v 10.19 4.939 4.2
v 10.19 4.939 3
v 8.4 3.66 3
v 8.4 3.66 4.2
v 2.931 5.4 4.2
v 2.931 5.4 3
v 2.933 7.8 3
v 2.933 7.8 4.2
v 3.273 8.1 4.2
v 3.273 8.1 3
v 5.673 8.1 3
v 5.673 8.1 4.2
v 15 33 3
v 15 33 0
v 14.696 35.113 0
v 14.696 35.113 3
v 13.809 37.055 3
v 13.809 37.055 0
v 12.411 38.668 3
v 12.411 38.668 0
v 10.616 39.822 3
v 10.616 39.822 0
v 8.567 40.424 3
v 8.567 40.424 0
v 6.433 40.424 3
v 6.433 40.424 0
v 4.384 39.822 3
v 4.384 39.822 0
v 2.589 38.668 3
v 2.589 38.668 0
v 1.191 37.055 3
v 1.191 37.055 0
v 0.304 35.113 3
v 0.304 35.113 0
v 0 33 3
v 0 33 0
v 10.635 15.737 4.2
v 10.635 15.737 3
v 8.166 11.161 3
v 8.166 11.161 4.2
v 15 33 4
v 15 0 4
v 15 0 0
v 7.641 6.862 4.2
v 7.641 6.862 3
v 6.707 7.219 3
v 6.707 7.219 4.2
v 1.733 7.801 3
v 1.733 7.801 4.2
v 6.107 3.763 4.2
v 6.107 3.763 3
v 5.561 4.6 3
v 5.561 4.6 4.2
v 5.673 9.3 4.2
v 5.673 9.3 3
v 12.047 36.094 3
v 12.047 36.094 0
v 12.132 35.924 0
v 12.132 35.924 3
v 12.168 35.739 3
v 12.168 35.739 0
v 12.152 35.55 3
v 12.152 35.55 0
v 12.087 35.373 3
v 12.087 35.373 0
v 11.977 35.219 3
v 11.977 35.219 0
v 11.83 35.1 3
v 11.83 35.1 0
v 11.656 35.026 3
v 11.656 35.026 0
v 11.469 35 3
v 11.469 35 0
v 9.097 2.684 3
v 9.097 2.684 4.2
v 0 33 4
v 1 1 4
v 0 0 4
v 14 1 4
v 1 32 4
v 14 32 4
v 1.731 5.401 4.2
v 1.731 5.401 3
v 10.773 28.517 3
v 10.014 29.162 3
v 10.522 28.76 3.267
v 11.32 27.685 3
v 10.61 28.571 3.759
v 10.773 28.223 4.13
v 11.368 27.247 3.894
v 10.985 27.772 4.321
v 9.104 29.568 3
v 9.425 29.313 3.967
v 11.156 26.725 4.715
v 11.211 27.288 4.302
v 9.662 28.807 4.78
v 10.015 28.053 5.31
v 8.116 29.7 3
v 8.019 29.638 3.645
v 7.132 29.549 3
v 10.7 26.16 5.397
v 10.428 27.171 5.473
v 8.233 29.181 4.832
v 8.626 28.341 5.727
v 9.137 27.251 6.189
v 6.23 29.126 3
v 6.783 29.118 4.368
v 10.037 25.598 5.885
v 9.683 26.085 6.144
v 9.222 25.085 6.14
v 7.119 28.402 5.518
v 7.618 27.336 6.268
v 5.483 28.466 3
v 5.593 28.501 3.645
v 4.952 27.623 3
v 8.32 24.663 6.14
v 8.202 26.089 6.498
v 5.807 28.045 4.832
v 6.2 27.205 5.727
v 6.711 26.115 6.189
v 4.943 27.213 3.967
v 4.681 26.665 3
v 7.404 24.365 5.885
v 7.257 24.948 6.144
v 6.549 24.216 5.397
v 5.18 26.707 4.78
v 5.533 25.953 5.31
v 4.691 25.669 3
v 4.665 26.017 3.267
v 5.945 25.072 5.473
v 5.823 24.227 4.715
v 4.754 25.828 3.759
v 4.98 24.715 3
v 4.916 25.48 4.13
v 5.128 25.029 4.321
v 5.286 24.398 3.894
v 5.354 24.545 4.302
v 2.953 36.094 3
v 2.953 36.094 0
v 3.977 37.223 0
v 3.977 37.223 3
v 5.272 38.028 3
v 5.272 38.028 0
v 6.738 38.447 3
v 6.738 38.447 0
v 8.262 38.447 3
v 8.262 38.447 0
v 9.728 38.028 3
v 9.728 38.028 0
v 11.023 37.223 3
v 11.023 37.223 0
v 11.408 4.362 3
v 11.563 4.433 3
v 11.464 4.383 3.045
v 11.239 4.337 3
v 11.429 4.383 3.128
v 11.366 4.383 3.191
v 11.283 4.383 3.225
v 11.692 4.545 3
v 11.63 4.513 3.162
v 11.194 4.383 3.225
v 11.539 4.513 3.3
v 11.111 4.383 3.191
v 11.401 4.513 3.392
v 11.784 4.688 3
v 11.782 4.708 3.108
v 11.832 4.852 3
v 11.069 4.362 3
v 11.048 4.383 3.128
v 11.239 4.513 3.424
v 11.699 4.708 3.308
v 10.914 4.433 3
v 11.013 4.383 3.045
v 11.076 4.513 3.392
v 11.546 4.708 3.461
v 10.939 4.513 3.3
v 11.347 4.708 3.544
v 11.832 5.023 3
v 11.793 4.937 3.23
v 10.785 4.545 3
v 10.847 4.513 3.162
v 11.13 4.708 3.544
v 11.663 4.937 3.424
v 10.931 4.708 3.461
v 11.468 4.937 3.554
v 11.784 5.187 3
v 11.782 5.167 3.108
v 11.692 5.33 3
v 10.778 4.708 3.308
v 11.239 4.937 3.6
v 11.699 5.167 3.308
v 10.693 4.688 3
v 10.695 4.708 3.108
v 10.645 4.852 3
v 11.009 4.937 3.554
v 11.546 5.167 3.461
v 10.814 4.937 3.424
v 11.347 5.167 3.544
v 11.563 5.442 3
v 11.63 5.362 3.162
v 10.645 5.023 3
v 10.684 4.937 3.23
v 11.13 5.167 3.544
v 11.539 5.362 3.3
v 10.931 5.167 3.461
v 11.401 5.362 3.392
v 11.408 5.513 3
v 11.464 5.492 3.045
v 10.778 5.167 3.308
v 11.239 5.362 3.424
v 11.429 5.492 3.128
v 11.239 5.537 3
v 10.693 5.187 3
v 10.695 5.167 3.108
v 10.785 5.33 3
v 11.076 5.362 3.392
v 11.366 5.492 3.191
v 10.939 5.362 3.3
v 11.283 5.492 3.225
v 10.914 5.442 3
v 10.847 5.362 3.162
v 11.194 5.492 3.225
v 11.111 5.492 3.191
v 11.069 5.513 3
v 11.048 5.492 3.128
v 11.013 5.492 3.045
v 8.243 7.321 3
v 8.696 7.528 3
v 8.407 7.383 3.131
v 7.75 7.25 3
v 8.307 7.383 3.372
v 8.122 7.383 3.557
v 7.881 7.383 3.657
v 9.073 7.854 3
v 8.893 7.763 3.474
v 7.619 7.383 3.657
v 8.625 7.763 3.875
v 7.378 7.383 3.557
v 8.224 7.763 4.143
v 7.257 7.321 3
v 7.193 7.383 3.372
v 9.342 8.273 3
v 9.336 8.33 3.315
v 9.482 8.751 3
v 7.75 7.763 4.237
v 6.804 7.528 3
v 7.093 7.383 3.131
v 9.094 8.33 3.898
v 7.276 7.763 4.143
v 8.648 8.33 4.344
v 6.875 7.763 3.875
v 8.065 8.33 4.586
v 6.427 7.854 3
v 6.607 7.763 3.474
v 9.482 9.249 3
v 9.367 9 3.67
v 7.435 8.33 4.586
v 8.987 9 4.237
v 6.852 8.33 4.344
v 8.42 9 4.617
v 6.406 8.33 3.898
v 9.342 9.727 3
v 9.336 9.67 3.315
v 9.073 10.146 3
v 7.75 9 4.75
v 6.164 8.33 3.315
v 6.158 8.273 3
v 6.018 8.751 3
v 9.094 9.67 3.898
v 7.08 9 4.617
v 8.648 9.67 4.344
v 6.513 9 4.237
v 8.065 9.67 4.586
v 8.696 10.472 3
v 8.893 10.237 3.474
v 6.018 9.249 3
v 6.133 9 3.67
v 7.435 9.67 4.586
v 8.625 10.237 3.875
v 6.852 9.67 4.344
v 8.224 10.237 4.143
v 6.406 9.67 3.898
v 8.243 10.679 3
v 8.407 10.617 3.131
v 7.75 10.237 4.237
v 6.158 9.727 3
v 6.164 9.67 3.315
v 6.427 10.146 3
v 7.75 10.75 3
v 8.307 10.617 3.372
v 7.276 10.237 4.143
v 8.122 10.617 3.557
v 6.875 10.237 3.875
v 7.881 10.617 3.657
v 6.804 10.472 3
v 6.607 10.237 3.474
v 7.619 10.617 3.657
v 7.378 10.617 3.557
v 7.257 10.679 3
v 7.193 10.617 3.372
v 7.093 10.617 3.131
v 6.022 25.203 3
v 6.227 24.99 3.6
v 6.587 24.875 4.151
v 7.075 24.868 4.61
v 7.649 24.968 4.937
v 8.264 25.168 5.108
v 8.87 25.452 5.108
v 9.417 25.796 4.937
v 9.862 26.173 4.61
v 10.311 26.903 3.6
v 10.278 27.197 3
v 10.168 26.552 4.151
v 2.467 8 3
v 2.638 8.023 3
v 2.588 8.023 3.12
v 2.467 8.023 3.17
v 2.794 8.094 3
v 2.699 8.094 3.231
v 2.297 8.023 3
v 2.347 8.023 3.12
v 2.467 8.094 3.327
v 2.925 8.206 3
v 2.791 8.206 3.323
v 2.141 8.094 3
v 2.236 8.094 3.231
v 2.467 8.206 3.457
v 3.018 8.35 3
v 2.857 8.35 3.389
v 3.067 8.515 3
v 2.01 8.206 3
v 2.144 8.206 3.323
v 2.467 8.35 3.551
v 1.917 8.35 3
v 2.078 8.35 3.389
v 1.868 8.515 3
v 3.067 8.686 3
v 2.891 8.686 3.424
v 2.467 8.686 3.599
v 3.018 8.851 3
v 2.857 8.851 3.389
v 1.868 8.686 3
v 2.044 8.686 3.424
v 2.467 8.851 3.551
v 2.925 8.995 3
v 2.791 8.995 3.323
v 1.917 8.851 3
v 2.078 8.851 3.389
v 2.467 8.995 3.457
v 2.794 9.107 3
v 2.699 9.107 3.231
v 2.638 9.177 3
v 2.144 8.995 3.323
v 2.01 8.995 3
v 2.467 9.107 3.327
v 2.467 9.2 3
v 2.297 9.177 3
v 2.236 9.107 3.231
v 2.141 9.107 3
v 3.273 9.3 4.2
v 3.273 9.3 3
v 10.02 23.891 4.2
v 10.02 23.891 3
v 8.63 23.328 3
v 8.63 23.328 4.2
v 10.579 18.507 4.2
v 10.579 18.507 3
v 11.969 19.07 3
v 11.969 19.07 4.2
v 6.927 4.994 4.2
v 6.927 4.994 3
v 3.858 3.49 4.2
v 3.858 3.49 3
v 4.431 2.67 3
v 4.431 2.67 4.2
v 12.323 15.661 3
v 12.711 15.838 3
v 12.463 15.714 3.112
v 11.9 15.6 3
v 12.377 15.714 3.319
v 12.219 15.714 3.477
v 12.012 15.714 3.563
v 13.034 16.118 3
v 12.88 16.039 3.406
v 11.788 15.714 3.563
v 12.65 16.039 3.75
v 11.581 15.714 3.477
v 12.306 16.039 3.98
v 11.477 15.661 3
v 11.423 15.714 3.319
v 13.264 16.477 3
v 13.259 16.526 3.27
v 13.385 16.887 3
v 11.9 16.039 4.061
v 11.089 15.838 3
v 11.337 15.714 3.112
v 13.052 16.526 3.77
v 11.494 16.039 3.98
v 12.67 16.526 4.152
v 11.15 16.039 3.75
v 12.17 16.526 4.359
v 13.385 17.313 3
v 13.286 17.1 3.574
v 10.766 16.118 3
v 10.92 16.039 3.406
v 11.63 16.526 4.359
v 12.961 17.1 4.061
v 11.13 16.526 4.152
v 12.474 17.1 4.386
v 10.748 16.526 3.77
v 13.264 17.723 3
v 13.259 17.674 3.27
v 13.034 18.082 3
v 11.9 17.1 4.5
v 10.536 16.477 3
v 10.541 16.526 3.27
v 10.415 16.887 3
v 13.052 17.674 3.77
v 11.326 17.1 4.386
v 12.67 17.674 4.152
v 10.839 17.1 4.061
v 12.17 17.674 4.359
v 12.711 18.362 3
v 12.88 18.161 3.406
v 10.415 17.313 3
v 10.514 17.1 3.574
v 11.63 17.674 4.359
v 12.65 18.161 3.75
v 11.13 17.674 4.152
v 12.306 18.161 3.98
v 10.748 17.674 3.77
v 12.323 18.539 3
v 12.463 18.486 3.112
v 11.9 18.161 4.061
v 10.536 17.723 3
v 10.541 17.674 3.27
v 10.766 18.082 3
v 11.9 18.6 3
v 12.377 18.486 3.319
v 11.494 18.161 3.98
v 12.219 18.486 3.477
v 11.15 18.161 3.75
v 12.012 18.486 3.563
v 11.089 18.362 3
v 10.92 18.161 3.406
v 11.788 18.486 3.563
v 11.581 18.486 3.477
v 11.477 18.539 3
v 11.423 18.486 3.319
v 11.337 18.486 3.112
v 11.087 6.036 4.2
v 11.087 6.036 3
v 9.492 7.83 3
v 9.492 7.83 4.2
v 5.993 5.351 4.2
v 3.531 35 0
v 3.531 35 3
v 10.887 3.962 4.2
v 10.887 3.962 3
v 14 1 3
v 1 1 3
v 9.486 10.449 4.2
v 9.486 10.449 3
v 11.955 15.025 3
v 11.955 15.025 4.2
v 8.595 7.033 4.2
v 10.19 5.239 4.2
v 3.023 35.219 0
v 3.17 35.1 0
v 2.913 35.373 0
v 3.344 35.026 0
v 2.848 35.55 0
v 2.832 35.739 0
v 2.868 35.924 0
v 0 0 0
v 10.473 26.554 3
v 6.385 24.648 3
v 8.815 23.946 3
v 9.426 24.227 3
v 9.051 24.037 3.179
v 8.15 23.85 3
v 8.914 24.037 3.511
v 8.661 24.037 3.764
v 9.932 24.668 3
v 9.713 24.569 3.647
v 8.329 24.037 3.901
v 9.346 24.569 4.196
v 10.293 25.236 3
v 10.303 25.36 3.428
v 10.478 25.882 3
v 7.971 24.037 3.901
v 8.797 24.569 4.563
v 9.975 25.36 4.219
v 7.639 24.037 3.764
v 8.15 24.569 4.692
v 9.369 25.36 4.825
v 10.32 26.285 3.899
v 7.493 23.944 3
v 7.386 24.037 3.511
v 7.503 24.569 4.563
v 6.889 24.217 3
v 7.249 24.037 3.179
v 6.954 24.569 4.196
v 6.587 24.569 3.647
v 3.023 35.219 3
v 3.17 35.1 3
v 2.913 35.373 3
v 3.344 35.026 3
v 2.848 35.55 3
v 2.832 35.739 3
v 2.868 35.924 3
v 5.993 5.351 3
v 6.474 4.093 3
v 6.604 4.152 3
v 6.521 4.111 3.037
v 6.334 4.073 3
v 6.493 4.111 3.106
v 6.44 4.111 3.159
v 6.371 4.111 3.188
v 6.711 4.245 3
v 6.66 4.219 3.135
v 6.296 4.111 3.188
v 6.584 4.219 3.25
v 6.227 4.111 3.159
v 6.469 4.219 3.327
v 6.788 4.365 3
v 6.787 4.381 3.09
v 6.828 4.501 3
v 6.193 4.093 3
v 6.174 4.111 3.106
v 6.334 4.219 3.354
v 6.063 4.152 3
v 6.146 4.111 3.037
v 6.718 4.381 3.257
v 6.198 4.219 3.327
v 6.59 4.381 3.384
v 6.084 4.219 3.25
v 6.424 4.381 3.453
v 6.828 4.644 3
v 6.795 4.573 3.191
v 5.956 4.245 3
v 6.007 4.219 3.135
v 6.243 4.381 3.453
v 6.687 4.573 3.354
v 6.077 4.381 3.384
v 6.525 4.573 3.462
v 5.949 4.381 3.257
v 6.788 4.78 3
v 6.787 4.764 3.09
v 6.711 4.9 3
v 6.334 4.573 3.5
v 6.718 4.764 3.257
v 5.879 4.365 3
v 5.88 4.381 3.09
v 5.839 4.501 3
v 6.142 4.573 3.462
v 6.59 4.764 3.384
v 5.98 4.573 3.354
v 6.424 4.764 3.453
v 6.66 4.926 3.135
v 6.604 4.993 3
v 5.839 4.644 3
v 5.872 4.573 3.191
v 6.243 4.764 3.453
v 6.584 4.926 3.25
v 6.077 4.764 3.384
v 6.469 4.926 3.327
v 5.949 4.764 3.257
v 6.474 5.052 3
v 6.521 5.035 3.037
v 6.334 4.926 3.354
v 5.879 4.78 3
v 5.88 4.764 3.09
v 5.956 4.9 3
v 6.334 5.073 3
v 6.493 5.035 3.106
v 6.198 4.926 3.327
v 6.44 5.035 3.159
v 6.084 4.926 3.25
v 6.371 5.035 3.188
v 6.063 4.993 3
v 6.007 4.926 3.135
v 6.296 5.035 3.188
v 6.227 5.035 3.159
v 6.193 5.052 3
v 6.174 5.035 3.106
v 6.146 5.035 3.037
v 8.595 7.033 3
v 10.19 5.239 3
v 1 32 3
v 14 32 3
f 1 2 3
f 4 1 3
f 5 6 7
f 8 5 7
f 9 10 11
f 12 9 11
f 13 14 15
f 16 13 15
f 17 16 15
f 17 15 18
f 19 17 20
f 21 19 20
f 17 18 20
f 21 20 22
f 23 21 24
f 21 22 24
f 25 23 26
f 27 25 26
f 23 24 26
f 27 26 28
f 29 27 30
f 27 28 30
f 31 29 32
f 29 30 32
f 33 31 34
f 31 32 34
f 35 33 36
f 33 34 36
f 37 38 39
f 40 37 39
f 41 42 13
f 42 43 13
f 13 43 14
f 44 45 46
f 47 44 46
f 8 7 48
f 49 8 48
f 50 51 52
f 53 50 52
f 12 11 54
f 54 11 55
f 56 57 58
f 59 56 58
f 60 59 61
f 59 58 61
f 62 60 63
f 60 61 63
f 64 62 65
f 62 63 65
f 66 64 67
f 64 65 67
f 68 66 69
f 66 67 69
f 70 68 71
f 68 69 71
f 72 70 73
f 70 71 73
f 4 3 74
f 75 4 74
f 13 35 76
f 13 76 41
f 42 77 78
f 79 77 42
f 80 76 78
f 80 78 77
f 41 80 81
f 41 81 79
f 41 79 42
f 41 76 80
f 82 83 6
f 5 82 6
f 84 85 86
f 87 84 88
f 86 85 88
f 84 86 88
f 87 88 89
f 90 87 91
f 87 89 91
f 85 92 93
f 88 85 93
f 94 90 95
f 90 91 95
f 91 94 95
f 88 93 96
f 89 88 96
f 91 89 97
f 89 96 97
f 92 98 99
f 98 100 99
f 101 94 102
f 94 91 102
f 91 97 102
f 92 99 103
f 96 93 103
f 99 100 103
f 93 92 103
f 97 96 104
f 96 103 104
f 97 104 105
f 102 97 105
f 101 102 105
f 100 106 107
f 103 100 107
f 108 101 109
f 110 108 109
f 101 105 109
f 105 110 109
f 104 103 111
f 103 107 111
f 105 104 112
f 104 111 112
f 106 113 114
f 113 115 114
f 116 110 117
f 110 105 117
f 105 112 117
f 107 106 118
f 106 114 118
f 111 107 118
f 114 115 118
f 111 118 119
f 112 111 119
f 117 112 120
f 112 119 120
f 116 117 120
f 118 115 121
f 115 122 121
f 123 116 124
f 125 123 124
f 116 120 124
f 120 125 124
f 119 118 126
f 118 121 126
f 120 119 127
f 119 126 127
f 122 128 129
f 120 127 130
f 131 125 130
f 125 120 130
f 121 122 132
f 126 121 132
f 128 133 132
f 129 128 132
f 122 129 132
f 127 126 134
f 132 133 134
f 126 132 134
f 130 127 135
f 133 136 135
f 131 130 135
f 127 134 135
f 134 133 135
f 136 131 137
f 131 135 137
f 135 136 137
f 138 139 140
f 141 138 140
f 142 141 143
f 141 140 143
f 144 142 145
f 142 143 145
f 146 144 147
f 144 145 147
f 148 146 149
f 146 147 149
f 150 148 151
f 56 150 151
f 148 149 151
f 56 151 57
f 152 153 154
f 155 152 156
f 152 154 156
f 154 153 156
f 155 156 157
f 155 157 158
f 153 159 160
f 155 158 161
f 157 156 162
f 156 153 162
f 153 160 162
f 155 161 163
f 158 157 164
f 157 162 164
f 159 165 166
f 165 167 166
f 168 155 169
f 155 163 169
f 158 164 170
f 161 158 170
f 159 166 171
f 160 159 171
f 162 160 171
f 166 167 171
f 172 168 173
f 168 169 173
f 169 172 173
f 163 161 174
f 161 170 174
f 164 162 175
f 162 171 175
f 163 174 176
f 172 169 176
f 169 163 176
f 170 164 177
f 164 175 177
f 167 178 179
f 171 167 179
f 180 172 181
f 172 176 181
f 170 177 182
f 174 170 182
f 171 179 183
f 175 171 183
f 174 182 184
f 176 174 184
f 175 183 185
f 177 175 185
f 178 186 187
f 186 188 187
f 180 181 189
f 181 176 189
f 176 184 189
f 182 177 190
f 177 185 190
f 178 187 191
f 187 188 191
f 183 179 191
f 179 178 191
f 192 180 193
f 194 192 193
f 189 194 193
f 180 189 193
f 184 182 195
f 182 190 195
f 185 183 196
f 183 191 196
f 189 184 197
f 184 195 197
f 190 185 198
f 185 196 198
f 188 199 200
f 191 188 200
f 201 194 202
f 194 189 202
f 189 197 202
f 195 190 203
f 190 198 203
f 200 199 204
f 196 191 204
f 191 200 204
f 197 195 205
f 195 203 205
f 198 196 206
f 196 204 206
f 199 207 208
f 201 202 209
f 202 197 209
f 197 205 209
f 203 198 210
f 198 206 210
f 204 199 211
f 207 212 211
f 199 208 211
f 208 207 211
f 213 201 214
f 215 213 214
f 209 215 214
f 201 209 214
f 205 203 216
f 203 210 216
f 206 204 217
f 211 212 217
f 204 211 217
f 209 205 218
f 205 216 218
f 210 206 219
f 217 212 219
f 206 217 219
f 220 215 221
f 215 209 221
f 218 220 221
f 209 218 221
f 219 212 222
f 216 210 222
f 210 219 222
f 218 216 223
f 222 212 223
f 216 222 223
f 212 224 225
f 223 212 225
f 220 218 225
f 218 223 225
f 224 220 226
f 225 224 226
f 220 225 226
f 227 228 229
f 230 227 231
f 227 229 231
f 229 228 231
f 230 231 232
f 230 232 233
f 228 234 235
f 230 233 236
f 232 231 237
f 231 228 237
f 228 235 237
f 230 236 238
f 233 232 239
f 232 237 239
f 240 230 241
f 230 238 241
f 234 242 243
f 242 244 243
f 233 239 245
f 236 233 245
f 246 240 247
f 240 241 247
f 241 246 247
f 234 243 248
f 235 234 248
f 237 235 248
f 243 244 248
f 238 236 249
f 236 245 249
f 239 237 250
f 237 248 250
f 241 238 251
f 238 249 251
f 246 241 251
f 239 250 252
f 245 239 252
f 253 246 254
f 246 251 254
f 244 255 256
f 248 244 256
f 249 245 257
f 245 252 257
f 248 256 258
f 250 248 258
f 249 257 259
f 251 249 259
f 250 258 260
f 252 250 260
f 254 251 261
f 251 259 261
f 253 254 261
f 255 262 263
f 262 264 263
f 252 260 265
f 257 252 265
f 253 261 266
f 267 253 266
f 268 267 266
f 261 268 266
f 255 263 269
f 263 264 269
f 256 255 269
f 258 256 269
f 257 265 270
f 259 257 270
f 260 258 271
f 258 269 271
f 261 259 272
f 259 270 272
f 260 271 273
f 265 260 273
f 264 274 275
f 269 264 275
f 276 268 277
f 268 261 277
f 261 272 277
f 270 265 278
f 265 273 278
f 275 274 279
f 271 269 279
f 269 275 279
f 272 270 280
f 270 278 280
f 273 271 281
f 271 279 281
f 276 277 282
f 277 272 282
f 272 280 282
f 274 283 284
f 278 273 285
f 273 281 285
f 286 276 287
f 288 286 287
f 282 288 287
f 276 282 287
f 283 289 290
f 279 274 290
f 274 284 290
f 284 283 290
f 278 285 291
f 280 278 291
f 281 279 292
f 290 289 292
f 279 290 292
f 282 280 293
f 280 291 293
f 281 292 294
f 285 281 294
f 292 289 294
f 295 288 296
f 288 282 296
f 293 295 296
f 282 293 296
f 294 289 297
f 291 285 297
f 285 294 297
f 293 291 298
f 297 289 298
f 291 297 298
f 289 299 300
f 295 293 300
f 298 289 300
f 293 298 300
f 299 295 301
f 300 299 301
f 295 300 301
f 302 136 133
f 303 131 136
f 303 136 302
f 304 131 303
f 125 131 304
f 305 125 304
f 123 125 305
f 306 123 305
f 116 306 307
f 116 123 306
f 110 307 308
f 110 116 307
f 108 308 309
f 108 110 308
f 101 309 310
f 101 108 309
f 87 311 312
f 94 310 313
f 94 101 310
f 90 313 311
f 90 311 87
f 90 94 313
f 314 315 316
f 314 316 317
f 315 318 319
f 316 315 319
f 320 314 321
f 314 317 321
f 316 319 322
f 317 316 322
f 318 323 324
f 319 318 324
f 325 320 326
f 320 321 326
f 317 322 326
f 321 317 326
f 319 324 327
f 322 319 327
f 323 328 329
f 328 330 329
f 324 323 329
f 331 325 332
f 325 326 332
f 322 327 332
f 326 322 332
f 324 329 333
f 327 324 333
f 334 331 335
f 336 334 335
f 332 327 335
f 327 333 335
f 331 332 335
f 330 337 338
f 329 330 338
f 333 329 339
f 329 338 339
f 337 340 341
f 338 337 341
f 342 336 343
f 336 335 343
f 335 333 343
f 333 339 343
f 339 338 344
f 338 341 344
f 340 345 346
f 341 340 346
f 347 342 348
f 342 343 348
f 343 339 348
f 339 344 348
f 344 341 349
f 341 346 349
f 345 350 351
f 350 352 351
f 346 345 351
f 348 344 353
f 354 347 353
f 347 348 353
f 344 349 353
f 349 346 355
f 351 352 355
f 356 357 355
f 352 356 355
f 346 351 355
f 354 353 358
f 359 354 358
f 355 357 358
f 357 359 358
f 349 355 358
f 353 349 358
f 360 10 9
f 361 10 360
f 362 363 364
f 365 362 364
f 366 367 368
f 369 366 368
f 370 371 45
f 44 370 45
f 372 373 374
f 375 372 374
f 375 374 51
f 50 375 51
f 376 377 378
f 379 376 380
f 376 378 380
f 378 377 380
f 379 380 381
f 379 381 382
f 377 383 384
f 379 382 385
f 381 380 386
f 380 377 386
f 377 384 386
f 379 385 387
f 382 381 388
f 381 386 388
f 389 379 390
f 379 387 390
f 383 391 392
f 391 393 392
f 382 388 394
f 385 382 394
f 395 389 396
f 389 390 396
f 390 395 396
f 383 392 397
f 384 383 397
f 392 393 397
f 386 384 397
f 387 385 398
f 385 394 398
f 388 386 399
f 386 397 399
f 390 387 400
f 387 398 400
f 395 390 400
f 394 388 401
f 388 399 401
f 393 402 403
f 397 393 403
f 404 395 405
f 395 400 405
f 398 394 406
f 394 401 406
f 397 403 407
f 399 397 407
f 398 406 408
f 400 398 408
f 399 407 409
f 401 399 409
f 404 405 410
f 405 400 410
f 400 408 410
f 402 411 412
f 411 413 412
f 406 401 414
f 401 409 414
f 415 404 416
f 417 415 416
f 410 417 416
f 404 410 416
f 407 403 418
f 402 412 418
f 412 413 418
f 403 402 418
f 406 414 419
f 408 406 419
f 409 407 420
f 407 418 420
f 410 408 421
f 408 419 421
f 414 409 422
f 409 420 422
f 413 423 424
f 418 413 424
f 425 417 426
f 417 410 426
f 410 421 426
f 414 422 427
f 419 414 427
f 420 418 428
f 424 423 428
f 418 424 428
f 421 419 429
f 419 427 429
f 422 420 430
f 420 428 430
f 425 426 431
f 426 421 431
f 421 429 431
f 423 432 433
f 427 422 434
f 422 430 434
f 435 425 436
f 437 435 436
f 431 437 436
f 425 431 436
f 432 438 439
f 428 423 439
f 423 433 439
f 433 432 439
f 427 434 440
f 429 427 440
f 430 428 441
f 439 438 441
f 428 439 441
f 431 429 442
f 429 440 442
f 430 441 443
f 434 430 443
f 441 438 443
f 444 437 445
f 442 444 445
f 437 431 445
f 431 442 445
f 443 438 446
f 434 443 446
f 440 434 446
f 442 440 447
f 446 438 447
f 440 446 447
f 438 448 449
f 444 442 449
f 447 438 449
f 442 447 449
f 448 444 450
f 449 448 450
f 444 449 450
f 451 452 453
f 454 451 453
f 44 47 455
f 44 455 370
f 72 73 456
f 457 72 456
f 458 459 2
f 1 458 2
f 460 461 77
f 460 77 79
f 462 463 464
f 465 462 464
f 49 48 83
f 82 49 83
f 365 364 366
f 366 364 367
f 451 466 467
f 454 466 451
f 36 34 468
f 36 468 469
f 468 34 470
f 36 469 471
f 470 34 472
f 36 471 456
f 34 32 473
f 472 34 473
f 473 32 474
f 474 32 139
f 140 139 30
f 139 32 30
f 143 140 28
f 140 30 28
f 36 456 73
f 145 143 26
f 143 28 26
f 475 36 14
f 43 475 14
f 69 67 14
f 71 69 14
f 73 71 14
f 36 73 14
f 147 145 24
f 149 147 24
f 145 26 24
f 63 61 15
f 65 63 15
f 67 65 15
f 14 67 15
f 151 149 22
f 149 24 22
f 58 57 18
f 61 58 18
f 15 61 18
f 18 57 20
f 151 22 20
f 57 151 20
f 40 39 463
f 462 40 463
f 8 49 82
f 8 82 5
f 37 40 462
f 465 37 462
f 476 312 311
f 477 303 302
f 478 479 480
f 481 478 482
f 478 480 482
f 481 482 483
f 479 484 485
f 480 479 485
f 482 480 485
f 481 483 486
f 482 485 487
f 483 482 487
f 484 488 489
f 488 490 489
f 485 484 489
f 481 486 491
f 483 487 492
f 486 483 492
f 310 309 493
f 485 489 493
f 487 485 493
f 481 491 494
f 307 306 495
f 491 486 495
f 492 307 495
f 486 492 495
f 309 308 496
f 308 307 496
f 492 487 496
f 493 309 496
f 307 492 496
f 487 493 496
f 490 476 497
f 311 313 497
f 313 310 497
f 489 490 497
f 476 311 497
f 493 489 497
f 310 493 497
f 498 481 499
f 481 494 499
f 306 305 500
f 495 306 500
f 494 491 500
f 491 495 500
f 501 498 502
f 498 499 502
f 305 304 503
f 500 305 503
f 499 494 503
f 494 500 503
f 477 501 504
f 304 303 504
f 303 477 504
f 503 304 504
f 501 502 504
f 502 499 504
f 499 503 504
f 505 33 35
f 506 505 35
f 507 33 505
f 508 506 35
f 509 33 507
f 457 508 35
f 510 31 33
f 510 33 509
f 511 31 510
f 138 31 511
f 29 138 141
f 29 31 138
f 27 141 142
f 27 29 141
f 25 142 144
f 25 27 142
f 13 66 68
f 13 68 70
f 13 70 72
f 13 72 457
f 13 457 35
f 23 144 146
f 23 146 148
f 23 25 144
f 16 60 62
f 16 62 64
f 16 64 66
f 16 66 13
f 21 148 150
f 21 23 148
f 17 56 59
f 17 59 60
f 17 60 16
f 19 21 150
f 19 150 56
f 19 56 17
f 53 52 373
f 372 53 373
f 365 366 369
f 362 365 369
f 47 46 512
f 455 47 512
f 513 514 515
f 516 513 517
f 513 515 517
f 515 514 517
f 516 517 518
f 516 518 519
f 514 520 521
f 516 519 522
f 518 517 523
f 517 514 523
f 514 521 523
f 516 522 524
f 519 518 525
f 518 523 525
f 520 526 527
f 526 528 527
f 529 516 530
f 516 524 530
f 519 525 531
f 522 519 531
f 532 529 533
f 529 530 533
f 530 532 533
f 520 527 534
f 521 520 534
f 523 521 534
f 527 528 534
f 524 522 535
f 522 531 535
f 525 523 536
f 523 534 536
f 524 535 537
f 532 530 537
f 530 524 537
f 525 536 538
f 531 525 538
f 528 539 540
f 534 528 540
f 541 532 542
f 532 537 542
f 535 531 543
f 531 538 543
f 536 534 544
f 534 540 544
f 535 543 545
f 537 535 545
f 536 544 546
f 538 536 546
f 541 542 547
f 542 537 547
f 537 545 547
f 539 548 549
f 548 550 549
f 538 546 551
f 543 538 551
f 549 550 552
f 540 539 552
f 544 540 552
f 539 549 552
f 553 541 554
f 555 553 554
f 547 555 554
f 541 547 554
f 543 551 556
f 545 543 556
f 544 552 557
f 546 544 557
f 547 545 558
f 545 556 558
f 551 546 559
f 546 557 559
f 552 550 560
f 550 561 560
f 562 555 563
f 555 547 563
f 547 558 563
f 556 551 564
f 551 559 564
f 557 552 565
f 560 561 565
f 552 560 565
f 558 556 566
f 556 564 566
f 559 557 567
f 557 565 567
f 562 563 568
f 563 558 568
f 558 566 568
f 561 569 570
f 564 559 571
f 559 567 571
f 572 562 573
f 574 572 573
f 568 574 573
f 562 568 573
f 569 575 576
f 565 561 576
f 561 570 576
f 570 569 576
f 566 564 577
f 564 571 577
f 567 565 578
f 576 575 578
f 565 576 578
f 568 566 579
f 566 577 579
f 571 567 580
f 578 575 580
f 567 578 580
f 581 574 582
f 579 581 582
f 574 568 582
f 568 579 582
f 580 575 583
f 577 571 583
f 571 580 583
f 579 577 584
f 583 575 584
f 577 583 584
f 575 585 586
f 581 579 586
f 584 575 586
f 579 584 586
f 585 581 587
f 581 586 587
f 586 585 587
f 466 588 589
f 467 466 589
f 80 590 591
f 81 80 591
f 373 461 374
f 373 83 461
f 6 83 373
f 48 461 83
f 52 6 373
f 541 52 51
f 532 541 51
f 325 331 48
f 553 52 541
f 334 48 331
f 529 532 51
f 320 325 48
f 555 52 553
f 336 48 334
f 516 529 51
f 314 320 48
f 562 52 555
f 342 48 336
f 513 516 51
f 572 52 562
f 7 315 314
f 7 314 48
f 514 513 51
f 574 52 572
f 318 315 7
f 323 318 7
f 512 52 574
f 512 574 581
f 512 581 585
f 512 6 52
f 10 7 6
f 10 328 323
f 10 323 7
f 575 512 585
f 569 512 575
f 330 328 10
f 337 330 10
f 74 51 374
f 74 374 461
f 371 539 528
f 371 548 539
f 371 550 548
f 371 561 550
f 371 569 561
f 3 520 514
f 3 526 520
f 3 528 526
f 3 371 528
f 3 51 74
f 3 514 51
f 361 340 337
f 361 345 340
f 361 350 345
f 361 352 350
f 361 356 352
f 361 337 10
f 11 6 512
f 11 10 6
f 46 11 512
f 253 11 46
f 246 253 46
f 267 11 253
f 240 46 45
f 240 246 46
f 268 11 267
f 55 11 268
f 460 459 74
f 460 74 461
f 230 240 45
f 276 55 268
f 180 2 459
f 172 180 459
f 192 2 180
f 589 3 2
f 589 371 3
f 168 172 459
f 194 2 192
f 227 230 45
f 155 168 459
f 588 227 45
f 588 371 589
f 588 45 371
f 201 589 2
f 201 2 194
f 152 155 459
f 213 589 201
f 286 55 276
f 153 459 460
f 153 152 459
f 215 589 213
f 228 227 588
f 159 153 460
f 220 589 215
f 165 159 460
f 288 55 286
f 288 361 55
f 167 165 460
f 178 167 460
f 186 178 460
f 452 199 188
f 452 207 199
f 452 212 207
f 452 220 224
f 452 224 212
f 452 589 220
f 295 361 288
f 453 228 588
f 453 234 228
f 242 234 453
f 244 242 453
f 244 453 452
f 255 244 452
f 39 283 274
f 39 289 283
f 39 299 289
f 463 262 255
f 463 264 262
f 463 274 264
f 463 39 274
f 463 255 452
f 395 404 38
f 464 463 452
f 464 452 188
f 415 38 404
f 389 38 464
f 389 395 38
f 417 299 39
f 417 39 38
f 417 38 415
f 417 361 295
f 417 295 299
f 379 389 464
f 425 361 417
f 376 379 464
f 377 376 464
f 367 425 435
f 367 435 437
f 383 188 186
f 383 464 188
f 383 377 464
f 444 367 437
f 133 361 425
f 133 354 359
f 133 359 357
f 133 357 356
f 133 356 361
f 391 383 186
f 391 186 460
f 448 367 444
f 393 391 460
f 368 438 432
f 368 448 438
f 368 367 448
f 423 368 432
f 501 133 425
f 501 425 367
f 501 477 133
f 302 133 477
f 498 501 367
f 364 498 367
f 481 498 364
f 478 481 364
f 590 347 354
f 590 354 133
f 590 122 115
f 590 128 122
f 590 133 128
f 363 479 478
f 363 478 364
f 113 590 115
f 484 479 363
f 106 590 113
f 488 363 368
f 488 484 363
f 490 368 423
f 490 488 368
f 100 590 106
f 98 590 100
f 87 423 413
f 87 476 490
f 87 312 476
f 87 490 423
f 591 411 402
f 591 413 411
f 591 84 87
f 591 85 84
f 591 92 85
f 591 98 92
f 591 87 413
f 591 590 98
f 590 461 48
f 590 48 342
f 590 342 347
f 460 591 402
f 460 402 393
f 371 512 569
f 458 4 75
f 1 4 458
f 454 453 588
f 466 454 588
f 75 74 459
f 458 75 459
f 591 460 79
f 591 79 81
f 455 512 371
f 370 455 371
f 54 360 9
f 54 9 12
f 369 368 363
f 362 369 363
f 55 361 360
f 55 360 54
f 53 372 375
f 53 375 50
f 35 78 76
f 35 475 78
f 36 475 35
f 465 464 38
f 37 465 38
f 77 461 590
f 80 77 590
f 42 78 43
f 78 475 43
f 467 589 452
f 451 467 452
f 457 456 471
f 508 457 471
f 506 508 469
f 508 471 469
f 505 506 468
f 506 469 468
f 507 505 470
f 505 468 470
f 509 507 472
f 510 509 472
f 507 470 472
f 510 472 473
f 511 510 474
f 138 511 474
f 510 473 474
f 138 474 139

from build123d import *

# Parameters (mm, degrees)
F0_W      = 15
F0_H      = 33
F1_DEPTH  = 3
F3_W      = 2.4
F3_H      = 1.2
F4_DEPTH  = 1.2
F7_DEPTH  = 1.2
F9_ANGLE  = 180
F11_ANGLE = 180
F15_ANGLE = 180
F16_ANGLE = 180
F18_ANGLE = 180
F19_ANGLE = 115
F20_ANGLE = 180
F2_W      = 15
F2_H      = 33
F2_W_2    = 13
F2_H_2    = 31
F21_DEPTH = 1


with BuildPart() as f1:
    # F0 (on Top) → F1 (new body)
    with BuildSketch(Plane.XY):
        with Locations((7.5, 16.5)):
            Rectangle(F0_W, F0_H)
        with BuildLine():
            ThreePointArc((15, 33), (7.5, 40.5), (0, 33))
            Line((0, 33), (15, 33))
        make_face()
        with BuildLine():
            Line((11.4686269666, 35), (3.5313730334, 35))
            ThreePointArc((3.5313730334, 35), (2.9126545999, 35.3726049787), (2.9526149341, 36.09375))
            ThreePointArc((2.9526149341, 36.09375), (7.5, 38.5), (12.0473850659, 36.09375))
            ThreePointArc((12.0473850659, 36.09375), (12.0873454001, 35.3726049787), (11.4686269666, 35))
        make_face(mode=Mode.SUBTRACT)
    extrude(amount=F1_DEPTH)

    # F3 (on face) → F4 (join)
    with BuildSketch(Plane.XY.offset(3)):
        with Locations((4.4729229599, 8.7)):
            Rectangle(F3_W, F3_H)
        Polygon((2.9330339742, 7.8), (1.7330344026, 7.801014062), (1.7310062787, 5.4010149189), (2.9310058502, 5.4000008569), align=None)
        Polygon((7.6412468567, 6.8621327115), (6.7072128218, 7.2193167279), (5.9928447889, 5.3512486581), (6.9268788238, 4.9940646416), align=None)
        Polygon((6.1065359398, 3.762840498), (5.5605625677, 4.6), (3.8578521609, 3.4895371309), (4.4313145482, 2.6703052404), align=None)
        Polygon((9.4921899433, 7.8298745016), (8.5952991901, 7.0326374121), (10.189773369, 5.2388559057), (11.0866641222, 6.0360929952), align=None)
        Polygon((9.0970460407, 2.6836514835), (10.8872594075, 3.9623758874), (10.189773369, 4.9388559057), (8.3995600022, 3.6601315018), align=None)
    extrude(amount=F4_DEPTH)

    # F6 (on face) → F7 (join)
    with BuildSketch(Plane.XY.offset(3)):
        Polygon((8.6297593251, 23.3283319113), (10.5786629425, 18.5073595312), (11.9693280521, 19.069543267), (10.0204244347, 23.8905156471), align=None)
        Polygon((9.485872163, 10.4485981269), (11.9552081585, 15.0248826178), (10.6351260938, 15.737191078), (8.1657900983, 11.1609065871), align=None)
    extrude(amount=F7_DEPTH)

    # F8 (on face) → F9 (revolve)
    with BuildSketch(Plane.XY.offset(3)):
        with BuildLine():
            Line((11.9, 18.6), (11.9, 15.6))
            ThreePointArc((11.9, 15.6), (13.4, 17.1), (11.9, 18.6))
        make_face()
    revolve(axis=Axis((11.9, 17.1, 3), (0, -1, 0)), revolution_arc=F9_ANGLE)

    # F10 (on face) → F11 (revolve)
    with BuildSketch(Plane.XY.offset(3)):
        with BuildLine():
            Line((8.15, 28.55), (8.15, 23.85))
            ThreePointArc((8.15, 23.85), (10.5, 26.2), (8.15, 28.55))
        make_face()
    revolve(axis=Axis((8.15, 26.2, 3), (0, -1, 0)), revolution_arc=F11_ANGLE)

    # F14 (on face) → F15 (revolve)
    with BuildSketch(Plane.XY.offset(3)):
        with BuildLine():
            Line((2.4674874008, 9.2003644818), (2.4674874008, 8.0004137249))
            ThreePointArc((2.4674874008, 8.0004137249), (3.0729229599, 8.6003891034), (2.4674874008, 9.2003644818))
        make_face()
    revolve(axis=Axis((2.4674874008, 8.6003891034, 3), (0, -1, 0)), revolution_arc=F15_ANGLE)

    # F13 (on face) → F16 (revolve)
    with BuildSketch(Plane.XY.offset(3)):
        with BuildLine():
            Line((6.3335492538, 5.0726566499), (6.3335492538, 4.0726566499))
            ThreePointArc((6.3335492538, 4.0726566499), (6.8335492538, 4.5726566499), (6.3335492538, 5.0726566499))
        make_face()
    revolve(axis=Axis((6.3335492538, 4.5726566499, 3), (0, -1, 0)), revolution_arc=F16_ANGLE)

    # F17 (on face) → F18 (revolve)
    with BuildSketch(Plane.XY.offset(3)):
        with BuildLine():
            Line((11.2385163883, 5.5374744504), (11.2385163883, 4.3374744504))
            ThreePointArc((11.2385163883, 4.3374744504), (11.8385163883, 4.9374744504), (11.2385163883, 5.5374744504))
        make_face()
    revolve(axis=Axis((11.2385163883, 4.9374744504, 3), (0, -1, 0)), revolution_arc=F18_ANGLE)

    # F12 (on face) → F19 (revolve)
    with BuildSketch(Plane.XY.offset(3)):
        with BuildLine():
            Line((4.9804255393, 24.7154806374), (11.3195744607, 27.6845193626))
            ThreePointArc((11.3195744607, 27.6845193626), (6.6654806374, 29.3695744607), (4.9804255393, 24.7154806374))
        make_face()
    revolve(axis=Axis((8.15, 26.2, 3), (0.9055927031, 0.4241483893, 0)), revolution_arc=F19_ANGLE)

    # F5 (on face) → F20 (revolve)
    with BuildSketch(Plane.XY.offset(3)):
        with BuildLine():
            Line((7.75, 10.75), (7.75, 7.25))
            ThreePointArc((7.75, 7.25), (9.5, 9), (7.75, 10.75))
        make_face()
    revolve(axis=Axis((7.75, 9, 3), (0, -1, 0)), revolution_arc=F20_ANGLE)

    # F2 (on face) → F21 (join)
    with BuildSketch(Plane.XY.offset(3)):
        with Locations((7.5, 16.5)):
            Rectangle(F2_W, F2_H)
        with Locations((7.5, 16.5)):
            Rectangle(F2_W_2, F2_H_2, mode=Mode.SUBTRACT)
    extrude(amount=F21_DEPTH)


solid = f1.part
